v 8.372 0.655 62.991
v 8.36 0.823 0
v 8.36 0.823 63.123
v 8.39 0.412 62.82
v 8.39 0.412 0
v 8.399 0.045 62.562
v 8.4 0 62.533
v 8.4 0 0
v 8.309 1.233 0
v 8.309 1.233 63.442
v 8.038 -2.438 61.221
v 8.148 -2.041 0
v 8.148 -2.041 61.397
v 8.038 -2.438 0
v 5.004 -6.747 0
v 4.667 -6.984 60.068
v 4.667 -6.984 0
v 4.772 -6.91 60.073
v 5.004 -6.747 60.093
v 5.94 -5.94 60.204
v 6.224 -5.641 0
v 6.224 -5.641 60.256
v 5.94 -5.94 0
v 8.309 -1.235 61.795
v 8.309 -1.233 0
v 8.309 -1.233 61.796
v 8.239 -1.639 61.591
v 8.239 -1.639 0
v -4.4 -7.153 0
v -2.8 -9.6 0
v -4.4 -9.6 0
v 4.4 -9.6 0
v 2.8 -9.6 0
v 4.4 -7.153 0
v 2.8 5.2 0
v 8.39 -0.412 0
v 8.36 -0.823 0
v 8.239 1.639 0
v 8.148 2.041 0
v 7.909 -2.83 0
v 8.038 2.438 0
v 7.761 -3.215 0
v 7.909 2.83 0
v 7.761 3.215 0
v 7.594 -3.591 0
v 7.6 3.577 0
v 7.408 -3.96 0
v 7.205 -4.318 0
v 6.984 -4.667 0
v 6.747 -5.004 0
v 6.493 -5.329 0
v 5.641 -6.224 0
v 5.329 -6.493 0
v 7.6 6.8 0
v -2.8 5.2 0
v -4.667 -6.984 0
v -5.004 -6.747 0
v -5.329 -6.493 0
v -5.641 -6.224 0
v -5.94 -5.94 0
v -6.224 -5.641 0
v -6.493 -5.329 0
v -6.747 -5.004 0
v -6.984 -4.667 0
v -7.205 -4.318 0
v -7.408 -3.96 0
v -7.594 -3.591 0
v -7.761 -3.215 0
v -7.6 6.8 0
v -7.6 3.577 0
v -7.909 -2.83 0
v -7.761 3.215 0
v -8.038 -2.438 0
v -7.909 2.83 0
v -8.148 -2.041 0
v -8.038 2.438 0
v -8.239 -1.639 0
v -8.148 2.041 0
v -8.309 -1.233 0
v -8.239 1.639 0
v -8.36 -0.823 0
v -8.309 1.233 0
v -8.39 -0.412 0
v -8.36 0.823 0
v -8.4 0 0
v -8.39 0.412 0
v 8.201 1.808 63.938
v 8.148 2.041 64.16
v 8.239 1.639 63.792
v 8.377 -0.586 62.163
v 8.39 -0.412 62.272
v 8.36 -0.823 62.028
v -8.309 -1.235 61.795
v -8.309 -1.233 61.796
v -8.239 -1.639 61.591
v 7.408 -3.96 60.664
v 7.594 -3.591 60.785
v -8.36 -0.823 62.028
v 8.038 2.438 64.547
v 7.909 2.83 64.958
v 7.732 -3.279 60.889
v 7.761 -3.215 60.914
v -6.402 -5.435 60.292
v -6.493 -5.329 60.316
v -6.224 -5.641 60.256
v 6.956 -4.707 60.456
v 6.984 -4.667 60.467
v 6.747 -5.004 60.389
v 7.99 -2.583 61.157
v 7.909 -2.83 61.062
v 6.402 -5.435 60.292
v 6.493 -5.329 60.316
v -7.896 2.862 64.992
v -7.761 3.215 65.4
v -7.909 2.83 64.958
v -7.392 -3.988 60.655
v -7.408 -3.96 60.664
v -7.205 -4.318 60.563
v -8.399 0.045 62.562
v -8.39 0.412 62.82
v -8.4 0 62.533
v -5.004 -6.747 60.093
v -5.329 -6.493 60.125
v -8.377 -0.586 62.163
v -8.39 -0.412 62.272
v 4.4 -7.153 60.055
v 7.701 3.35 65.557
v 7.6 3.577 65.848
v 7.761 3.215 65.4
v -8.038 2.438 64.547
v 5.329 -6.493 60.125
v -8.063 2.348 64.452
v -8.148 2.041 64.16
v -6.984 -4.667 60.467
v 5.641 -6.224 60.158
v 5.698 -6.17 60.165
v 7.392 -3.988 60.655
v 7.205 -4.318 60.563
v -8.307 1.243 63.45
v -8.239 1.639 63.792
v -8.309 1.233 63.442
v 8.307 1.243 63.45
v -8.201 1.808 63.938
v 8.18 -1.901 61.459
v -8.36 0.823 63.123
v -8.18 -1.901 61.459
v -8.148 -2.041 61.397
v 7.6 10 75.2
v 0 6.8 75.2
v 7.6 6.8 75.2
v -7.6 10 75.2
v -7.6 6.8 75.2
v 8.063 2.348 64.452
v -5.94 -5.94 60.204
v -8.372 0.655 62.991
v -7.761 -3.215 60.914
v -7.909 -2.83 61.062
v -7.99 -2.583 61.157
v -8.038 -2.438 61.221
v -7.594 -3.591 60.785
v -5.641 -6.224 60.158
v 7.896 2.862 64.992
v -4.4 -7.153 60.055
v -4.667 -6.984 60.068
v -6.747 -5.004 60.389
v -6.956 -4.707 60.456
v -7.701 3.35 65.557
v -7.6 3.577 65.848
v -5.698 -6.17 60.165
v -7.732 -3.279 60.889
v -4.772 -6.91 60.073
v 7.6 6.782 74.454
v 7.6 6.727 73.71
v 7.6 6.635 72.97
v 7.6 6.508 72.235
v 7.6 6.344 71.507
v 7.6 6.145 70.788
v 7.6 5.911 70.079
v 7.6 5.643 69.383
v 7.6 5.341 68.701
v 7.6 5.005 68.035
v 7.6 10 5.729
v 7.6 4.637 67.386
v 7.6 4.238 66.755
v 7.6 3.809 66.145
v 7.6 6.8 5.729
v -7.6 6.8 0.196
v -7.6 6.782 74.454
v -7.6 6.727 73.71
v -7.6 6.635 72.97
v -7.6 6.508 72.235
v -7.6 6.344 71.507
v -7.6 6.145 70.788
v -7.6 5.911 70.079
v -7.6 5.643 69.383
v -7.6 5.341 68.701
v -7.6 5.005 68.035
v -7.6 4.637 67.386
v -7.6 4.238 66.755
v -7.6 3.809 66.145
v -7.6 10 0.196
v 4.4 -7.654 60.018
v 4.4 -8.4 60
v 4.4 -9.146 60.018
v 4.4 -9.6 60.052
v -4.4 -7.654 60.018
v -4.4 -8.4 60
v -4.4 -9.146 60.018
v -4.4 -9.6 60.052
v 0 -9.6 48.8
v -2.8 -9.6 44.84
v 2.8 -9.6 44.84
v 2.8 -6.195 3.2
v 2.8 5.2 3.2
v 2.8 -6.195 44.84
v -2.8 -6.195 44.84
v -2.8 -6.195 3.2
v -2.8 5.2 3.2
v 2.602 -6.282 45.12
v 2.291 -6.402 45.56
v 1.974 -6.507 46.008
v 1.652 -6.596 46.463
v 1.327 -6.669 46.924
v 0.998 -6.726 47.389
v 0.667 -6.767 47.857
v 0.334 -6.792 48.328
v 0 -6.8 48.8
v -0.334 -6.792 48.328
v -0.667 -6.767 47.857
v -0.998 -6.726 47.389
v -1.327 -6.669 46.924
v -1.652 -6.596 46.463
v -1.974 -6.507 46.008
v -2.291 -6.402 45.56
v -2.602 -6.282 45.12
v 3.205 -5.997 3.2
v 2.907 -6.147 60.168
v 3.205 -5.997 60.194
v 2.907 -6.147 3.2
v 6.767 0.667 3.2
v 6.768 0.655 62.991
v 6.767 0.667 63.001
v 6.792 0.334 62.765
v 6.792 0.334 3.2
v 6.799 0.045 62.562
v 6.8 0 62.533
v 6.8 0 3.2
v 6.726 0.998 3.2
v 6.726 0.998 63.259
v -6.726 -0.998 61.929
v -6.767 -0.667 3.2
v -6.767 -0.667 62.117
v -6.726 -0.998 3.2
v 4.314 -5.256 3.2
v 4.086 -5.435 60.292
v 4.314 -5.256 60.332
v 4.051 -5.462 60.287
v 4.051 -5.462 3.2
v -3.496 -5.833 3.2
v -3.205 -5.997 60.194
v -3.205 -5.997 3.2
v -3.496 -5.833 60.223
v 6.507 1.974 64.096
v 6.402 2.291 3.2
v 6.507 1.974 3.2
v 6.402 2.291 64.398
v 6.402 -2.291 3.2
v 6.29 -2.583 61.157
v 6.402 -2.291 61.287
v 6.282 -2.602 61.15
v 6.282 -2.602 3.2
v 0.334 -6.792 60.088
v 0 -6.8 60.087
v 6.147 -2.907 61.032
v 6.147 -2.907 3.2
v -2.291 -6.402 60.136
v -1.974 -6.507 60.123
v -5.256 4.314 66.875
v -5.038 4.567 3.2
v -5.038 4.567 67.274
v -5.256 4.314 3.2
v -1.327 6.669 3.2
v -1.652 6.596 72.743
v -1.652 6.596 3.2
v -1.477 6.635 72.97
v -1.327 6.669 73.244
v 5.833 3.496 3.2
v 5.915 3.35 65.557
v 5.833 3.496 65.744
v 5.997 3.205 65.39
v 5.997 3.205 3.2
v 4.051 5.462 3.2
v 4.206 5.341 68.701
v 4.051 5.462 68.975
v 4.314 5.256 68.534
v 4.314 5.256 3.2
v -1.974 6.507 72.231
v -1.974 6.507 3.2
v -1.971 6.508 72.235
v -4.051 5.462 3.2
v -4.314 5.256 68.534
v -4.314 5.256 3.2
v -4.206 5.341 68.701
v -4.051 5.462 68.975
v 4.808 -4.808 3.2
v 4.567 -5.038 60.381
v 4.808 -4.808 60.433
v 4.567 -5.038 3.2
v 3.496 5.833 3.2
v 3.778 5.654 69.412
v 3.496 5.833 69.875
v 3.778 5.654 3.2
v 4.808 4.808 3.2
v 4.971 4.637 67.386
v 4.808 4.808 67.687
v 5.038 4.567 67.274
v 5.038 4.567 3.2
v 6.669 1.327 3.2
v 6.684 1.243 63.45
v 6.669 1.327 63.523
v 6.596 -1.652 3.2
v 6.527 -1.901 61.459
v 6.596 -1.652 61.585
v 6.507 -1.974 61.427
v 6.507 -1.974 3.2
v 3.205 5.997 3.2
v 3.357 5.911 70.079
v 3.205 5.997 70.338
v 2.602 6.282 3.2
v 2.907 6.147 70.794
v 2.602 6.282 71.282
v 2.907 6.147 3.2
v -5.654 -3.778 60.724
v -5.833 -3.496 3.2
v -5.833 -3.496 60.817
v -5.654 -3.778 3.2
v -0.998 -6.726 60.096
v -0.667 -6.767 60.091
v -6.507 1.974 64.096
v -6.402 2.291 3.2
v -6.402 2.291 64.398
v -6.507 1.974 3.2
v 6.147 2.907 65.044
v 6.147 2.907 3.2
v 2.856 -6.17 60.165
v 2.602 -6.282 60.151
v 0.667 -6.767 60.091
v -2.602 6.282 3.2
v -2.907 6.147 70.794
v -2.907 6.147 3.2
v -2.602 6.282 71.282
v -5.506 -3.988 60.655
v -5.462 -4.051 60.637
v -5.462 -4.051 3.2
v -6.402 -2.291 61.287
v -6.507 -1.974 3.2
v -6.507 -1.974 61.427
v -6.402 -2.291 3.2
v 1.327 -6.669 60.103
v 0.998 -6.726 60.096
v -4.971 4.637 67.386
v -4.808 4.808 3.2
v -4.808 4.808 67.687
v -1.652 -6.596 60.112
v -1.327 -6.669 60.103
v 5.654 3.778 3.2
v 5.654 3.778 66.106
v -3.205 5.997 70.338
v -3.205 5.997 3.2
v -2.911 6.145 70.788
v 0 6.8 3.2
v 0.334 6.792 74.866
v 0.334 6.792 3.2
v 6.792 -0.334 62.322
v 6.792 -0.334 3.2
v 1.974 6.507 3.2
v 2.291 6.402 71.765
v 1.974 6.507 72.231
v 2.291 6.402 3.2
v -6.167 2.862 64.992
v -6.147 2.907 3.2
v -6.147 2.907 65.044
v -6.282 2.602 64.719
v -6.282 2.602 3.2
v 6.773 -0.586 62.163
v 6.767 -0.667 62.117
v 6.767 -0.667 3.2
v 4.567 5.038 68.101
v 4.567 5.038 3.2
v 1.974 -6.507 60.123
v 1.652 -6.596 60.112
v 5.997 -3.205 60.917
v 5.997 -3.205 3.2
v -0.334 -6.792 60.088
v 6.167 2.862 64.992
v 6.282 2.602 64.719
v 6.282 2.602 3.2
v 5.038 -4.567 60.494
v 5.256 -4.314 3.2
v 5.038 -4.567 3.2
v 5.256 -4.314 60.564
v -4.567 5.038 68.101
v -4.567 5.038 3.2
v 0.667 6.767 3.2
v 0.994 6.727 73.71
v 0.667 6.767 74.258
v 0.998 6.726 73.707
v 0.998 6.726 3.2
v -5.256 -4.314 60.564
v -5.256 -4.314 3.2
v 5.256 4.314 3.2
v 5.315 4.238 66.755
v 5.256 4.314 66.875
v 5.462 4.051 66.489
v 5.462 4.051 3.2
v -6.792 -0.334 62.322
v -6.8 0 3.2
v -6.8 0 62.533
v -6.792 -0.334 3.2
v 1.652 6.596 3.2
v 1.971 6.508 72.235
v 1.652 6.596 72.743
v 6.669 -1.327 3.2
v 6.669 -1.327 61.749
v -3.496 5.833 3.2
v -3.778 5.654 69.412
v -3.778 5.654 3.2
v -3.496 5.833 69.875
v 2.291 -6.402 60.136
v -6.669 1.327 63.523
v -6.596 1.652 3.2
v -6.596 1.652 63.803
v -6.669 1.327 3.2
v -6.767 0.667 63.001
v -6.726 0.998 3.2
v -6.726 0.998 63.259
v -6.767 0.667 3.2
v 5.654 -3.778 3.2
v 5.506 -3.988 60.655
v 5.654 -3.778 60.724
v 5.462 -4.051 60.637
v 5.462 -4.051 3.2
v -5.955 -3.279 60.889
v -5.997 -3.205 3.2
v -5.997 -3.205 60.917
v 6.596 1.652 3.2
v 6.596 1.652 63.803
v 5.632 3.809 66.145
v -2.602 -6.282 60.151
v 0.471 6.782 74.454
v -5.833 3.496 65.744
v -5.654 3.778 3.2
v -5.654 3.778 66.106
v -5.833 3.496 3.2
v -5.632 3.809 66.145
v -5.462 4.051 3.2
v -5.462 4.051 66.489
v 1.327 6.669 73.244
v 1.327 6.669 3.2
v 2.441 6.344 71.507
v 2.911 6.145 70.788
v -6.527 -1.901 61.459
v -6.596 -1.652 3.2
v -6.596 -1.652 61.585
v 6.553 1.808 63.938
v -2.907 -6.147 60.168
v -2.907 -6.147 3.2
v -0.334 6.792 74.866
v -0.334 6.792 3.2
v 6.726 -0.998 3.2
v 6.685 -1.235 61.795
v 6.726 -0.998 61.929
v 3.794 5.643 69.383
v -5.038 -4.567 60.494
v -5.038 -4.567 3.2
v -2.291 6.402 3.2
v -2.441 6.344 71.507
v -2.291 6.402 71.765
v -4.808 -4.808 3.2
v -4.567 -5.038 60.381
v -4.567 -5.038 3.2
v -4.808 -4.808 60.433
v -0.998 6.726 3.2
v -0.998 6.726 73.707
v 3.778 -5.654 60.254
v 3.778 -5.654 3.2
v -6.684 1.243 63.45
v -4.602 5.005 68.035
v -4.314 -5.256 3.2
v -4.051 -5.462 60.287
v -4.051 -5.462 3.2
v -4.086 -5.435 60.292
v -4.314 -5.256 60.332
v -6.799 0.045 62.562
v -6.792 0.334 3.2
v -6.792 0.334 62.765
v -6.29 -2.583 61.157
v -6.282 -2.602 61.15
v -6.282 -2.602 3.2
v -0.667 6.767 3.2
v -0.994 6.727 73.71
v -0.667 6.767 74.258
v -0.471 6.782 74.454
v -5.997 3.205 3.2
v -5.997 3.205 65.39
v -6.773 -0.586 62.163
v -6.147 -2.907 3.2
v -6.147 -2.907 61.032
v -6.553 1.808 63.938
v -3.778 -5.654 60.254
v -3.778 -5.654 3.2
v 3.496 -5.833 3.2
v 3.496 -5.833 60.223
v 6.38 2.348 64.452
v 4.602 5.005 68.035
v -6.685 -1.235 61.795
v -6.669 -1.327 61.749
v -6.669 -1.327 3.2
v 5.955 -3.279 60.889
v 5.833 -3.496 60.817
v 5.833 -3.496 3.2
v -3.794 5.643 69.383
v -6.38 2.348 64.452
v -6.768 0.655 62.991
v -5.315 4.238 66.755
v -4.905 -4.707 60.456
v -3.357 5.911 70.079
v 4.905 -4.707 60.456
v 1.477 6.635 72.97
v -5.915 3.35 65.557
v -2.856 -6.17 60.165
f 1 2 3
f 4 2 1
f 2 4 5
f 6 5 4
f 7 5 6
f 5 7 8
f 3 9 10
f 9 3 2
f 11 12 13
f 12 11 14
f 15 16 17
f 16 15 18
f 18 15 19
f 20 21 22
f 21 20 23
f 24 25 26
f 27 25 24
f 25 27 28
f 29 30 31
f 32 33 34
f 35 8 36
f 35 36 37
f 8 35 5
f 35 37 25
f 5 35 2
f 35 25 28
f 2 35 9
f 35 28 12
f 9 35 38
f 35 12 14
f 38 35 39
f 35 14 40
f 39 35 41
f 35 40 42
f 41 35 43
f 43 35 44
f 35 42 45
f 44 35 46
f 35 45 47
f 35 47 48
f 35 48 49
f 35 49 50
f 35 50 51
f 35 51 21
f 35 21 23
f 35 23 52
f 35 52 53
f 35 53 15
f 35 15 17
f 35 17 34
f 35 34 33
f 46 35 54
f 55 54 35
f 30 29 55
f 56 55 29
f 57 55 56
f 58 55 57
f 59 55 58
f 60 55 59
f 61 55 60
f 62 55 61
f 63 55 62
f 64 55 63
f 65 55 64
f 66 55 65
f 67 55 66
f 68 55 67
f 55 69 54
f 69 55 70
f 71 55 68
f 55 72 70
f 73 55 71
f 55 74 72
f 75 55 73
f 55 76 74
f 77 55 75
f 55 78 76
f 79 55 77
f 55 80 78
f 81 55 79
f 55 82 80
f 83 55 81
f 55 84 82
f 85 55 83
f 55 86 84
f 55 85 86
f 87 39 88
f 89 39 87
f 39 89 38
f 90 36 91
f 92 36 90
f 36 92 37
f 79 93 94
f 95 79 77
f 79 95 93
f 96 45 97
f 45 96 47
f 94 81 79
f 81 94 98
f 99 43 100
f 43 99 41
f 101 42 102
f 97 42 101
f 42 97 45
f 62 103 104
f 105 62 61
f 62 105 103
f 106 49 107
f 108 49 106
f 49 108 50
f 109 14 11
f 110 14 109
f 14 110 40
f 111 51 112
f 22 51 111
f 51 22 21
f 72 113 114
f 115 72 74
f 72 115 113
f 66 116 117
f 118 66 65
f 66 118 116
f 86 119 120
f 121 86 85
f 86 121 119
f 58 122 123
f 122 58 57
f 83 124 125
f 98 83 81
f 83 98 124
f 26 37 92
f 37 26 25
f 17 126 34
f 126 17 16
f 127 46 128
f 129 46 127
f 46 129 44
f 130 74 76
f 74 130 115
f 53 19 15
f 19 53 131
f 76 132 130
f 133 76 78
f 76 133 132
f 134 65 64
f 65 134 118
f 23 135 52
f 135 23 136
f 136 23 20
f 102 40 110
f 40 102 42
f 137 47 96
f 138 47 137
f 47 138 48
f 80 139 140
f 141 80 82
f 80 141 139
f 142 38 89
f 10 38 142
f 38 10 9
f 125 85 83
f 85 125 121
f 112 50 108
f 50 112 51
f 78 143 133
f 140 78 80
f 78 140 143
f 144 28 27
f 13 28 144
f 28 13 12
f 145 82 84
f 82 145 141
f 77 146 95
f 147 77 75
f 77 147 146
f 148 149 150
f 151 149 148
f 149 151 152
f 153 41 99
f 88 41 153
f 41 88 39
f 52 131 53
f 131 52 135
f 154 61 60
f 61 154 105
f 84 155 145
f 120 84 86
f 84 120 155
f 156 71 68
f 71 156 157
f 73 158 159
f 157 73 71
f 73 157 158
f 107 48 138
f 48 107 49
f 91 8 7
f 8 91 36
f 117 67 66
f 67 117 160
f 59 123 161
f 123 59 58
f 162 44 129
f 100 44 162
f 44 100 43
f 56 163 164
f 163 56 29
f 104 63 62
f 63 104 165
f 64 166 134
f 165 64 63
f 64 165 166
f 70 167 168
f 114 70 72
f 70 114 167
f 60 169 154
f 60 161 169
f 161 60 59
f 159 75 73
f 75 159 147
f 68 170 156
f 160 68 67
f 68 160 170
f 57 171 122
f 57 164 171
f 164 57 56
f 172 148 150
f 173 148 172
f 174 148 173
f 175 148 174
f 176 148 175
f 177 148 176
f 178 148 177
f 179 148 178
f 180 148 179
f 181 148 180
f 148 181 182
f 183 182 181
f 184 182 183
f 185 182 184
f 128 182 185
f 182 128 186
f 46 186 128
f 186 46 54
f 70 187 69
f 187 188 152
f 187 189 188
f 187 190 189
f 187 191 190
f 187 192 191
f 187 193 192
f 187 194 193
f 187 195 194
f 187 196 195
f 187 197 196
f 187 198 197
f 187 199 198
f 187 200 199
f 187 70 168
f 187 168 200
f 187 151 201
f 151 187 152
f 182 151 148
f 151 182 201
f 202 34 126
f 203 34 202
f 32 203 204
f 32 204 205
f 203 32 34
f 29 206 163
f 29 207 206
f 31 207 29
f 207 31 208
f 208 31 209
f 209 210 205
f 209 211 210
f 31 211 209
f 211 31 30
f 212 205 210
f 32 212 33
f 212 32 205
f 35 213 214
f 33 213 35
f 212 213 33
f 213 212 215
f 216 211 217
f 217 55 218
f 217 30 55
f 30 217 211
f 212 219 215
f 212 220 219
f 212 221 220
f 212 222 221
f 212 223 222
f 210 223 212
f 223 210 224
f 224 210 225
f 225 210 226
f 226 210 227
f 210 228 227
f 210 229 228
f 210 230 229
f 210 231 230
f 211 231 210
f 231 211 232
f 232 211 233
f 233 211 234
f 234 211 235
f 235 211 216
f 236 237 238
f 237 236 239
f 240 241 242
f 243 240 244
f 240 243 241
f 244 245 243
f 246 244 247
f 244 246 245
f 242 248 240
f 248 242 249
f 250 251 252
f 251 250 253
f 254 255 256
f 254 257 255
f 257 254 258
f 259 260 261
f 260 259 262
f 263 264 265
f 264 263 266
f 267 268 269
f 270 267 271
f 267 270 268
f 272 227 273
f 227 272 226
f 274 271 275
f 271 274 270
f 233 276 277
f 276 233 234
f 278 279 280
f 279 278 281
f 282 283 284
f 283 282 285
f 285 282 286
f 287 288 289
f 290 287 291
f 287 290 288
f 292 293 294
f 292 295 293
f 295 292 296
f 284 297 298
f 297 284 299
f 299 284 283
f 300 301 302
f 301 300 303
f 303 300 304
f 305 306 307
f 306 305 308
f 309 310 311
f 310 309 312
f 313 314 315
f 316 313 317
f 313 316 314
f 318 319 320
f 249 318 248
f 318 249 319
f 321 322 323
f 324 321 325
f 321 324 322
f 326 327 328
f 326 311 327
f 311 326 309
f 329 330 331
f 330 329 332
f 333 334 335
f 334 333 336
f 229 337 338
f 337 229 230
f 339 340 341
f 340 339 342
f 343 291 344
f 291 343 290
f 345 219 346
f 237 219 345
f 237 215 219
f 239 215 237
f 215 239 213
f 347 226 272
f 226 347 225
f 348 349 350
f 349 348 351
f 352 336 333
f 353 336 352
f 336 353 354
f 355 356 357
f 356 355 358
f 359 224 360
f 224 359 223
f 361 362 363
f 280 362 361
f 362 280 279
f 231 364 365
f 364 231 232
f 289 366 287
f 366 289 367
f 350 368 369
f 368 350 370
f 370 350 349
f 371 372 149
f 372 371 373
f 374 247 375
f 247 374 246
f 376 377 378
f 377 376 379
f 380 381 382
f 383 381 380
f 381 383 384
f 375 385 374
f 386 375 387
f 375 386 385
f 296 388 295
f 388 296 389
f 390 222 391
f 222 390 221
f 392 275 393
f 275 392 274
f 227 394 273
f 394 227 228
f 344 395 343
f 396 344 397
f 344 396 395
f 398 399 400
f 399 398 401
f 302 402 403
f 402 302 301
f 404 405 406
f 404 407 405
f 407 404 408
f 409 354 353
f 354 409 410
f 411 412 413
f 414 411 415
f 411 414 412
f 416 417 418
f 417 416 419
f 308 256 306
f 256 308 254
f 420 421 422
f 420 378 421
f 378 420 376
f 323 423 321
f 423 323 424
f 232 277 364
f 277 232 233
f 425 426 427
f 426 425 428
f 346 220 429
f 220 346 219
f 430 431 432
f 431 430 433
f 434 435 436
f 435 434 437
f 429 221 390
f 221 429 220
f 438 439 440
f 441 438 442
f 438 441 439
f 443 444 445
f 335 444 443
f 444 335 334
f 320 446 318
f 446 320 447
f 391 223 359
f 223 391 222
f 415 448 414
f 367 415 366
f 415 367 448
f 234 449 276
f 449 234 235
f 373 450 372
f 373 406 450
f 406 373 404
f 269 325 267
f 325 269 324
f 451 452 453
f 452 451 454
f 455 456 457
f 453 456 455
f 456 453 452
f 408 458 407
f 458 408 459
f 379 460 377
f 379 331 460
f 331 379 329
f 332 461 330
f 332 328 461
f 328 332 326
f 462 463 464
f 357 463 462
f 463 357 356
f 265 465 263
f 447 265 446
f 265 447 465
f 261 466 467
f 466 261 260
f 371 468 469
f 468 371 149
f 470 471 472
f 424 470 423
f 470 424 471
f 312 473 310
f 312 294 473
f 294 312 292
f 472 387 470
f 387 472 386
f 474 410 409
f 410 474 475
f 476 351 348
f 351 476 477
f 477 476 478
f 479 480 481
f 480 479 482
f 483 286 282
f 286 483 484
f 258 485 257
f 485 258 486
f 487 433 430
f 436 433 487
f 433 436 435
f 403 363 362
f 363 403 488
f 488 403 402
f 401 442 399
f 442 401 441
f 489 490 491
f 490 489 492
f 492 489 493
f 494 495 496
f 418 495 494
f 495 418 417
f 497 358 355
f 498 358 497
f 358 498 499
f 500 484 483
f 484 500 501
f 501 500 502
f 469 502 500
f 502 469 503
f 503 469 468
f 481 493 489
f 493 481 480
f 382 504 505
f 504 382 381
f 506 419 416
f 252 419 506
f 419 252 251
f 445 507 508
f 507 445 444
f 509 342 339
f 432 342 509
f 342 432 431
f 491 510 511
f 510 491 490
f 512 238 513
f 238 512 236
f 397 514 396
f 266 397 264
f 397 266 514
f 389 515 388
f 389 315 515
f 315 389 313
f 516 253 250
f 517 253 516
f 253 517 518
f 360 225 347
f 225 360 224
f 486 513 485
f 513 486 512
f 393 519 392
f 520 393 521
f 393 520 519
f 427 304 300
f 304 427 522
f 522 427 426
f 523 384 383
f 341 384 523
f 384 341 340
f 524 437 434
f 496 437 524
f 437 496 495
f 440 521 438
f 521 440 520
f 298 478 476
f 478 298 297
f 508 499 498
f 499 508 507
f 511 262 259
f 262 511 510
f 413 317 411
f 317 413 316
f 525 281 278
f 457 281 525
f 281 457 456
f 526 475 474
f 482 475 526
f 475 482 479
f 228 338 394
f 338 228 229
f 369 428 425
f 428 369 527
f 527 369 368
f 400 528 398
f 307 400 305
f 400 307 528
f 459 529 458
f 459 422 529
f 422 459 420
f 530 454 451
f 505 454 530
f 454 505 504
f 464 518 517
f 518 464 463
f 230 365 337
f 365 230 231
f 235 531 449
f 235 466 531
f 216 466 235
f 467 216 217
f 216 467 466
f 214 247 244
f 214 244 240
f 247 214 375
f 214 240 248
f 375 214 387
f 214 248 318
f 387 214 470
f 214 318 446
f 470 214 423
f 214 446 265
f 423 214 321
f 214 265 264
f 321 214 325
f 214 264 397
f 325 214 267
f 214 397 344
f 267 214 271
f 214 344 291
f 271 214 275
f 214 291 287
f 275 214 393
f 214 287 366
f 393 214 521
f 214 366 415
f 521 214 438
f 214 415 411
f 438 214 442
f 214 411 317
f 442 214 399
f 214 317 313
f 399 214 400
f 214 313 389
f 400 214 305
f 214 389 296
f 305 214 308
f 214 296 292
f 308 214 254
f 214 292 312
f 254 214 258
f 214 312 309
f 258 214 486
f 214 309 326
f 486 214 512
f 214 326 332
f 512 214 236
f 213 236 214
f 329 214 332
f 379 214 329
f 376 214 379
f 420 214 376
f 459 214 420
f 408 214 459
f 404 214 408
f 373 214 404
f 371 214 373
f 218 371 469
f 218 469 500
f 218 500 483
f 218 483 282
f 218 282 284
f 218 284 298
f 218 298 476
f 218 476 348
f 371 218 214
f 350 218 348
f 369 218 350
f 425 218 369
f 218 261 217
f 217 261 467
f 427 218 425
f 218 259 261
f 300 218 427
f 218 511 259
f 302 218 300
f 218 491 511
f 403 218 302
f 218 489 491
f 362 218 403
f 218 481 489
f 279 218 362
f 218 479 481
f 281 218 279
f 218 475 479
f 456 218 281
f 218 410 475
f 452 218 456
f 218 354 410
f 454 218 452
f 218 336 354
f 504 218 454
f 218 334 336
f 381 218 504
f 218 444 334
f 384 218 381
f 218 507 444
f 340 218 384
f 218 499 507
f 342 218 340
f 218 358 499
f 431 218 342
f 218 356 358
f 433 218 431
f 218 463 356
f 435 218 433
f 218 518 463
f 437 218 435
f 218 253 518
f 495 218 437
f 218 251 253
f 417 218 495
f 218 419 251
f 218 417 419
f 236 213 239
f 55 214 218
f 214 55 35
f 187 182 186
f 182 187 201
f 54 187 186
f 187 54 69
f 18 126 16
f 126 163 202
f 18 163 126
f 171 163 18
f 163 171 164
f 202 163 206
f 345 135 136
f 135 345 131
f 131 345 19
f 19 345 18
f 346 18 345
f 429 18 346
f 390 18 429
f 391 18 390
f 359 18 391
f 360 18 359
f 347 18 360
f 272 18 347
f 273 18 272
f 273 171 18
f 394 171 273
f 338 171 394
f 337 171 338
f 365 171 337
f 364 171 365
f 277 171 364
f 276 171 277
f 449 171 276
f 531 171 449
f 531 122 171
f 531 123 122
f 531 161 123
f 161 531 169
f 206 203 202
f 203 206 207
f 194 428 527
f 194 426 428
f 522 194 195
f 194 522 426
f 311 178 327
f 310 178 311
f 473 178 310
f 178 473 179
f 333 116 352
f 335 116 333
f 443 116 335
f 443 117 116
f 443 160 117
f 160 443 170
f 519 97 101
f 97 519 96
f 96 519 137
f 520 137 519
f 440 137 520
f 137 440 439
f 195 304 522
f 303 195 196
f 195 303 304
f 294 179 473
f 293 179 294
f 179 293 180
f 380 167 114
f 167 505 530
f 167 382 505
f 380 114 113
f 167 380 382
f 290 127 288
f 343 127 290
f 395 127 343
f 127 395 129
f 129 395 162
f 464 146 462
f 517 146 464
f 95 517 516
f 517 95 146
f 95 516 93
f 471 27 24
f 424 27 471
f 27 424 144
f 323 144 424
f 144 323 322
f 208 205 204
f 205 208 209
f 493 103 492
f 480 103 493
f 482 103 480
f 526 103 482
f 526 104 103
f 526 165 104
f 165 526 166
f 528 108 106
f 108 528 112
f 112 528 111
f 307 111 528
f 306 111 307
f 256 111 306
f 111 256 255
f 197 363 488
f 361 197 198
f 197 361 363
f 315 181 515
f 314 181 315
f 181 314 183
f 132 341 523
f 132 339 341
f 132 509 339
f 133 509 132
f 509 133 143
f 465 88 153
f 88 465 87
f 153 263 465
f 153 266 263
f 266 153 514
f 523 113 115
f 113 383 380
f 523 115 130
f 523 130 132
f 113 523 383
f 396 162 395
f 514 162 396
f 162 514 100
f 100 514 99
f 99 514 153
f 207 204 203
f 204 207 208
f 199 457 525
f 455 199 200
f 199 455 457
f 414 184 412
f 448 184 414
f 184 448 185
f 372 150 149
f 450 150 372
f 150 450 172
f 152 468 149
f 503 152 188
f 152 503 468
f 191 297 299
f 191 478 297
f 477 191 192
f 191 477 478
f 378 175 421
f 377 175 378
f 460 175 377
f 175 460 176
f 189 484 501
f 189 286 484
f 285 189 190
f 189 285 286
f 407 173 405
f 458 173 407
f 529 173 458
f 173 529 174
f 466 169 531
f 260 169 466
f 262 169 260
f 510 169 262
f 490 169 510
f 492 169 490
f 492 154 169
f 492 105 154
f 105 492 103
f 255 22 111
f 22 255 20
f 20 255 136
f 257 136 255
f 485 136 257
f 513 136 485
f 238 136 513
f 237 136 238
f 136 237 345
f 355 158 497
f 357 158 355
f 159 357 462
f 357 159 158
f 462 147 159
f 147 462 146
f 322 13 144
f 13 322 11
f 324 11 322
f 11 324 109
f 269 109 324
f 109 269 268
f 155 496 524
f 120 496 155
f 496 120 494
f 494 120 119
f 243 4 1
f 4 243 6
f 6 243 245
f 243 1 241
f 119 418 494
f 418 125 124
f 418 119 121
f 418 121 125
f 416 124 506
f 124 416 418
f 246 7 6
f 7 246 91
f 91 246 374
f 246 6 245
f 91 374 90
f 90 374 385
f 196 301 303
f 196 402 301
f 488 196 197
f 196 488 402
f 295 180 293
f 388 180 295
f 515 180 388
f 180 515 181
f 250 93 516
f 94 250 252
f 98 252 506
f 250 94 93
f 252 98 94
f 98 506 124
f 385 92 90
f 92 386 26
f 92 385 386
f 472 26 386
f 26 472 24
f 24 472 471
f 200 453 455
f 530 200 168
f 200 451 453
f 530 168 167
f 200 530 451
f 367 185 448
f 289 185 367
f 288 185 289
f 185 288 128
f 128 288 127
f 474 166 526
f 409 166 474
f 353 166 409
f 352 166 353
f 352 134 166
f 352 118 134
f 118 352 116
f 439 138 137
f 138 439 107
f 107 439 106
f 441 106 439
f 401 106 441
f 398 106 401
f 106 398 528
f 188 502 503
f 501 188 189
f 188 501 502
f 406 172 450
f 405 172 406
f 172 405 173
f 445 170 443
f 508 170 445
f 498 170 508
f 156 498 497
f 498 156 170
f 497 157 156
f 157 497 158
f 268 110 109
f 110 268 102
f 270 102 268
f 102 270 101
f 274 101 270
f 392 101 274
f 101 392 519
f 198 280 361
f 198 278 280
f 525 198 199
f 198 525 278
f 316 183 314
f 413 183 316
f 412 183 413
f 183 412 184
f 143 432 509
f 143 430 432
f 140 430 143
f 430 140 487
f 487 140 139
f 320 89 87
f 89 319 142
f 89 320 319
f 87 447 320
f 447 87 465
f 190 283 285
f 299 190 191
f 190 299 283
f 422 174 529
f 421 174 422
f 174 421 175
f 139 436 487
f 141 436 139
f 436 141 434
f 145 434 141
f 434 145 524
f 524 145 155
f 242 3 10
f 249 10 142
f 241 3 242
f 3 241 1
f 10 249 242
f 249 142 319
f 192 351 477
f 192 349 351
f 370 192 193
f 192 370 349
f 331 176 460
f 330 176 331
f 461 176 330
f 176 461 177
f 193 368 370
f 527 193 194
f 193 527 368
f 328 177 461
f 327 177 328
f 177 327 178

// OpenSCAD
// file: constants.scad
$fn = 128;
clearance = 0.2;        // wherever parts meet
print_head_width = 0.4; // 3d printer head diameter
print_no_support_angle = 50;  // overhang angle that needs no support

//spec_dart_d = 19;     // mega dart diameter
//d_len = 95;           // mega dart length
spec_dart_d = 13;       // spec elite dart diameter
d_len = 72;             // elite dart length
min_chamber_count = 15; // minimum chambers per cylinder
desired_cuff_d = 98;    // minimum cuff diameter in mm
jam_slot_width = 5.6;   // multiple of head diameter
race1 = 15;             // bottom edge of bearing race position.
bearing_w = 4 + 1;
bearing_d = 10;
bearing_inner_d = 5;
ratchet_angle = -20;

brushless_motor_d = 22;
brushless_motor_h = 12;
brushless_motor_screw_d = 5;
brushless_motor_screw_mount_r = 19/2;

// calculated constants
w_thickness = 4 * print_head_width; //multiples of 3d printer head diameter -> 1.6
flywheel_thickness = w_thickness * 2;
cyl_inner_thickness = w_thickness;

dart_d = ceil((spec_dart_d + 2 * clearance)/print_head_width) * print_head_width;
echo("calculated dart_d", dart_d);
dart_r = dart_d/2;

jam_slot_support_len = jam_slot_width * 2;

// Calculate the number of chambers based on chamber count and minimum cuff diameter
cuff_to_dart_delta = 3 * w_thickness + cyl_inner_thickness + dart_r;
calc_cyl_radius = desired_cuff_d/2 + cuff_to_dart_delta;
calc_cyl_deg = 2 * asin((dart_r + w_thickness/2)/calc_cyl_radius);
calc_ch_count = ceil(360/calc_cyl_deg);  // always round up

chamber_count = max([min_chamber_count, calc_ch_count]);
echo("minimum chamber count", min_chamber_count);
echo("final_chamber_count ", chamber_count);

brushless_motor_screw_mount_side = brushless_motor_screw_mount_r * sqrt(2);
motormount_w = (dart_r + flywheel_thickness) * 2 + brushless_motor_d;

cyl_len = d_len + w_thickness * 2;
race2 = cyl_len - race1 - bearing_w; // bottom edge of upper bearing
toroid_r = dart_d + w_thickness;
chamber_r = dart_r + w_thickness;
chamber_d = chamber_r * 2;
cyl_degrees = 360/chamber_count;
// chambers only need 1 w_thickness between each other
cyl_draw_radius = (dart_r + w_thickness/2) / sin(cyl_degrees/2);

echo("Minimum dart length", toroid_r + motormount_w/2 + jam_slot_support_len);

inner_r = cyl_draw_radius - dart_r - w_thickness;
final_inner = inner_r - cyl_inner_thickness;
race_r = final_inner + w_thickness;

// ratchet constants
post_d = w_thickness * 2;
slot_l = chamber_d + post_d; // a little extra movement
ratchet_l = chamber_d*2 + slot_l + post_d;
ratchet_w = post_d + w_thickness * 2;
ratchet_t = w_thickness * 1.5;

// constants for the motor mount and cylinder mount
cuff_outer_r = final_inner - w_thickness;
cuff_inner_r = cuff_outer_r - w_thickness;

echo("desired inner cuff diameter ", desired_cuff_d);
echo("final inner cuff diameter ", cuff_inner_r * 2);

cuff_h = cyl_len + w_thickness *2;
flange_r = cuff_outer_r + toroid_r;
bearing_mount_r = race_r - bearing_d/2;
mount_offset = race_r - bearing_d - w_thickness * 2;
mount_w = sqrt(cuff_outer_r * cuff_outer_r - mount_offset * mount_offset) * 2;
m_thickness = w_thickness * 2;
mount_alignment = m_thickness + (flywheel_thickness + brushless_motor_h)/2;
slider_t = cyl_draw_radius - mount_alignment - mount_offset;
slider_offset = slider_t + brushless_motor_screw_d/2 + w_thickness;

// returns a list of angles for the points of a regular polygon
function regular_polygon_angles(order) = [for (i=[0:order-1]) i*(360/order)];

// returns a list of coordinates and angle for the endpoints of a regular polygon
function regular_polygon_translation(order, r=1) = [
    for (th=regular_polygon_angles(order)) [[r*cos(th), r*sin(th), 0], th]];

module pipe(h, inner, outer) {
    difference() {
        cylinder(h, r=outer);
        cylinder(h, r=inner);
    }
}
module toroid(circle_r, toroid_r, convexity=10) {
    rotate_extrude(convexity)
    translate([toroid_r, 0, 0]) circle(r = circle_r);

}
module slide_slot(w, h, l, c=-clearance) {
    t_w = w * 2/3;
    t_l = l/2 + c;
    // clearance can be negative when building the part that goes inside
    difference() {
        union() {
            cube([w-t_w, h, l], center=true);
            translate([0, 0, l-t_l])
                resize([t_w + c , 0, 0]) rotate([0, 45, 0])
                cube([t_w, h, t_w], center=true);
        }
        translate([0, 0, l])
            cube([l, h, l], center=true);
        
    }
}

module slide_mount(slider_w, slider_l, slider_t, top=true) {
    if (top==true) {
        difference() {
            cube([slider_w, slider_l, slider_t], center=true);
            slide_slot(slider_w, slider_l, slider_t);
        }
    } else {
        slide_slot(slider_w, slider_l, slider_t);
    }
}
// main file
include <constants.scad>

module chamber(angle=0) {
    jswhalf = jam_slot_width/2.0;
    jswallw = jam_slot_width + 2.0 * w_thickness;
    js_support_offset = (toroid_r + jam_slot_support_len +  jam_slot_width * sqrt(2)/2);

    rotate(angle + 90) difference() {
		union() {
			difference() {
				difference () {
					union () {
						cylinder(h=cyl_len, r=chamber_r);
						// inner flat
						translate([0, chamber_r/2 + w_thickness, cyl_len/2])
							cube([chamber_d - w_thickness, chamber_r, cyl_len], center=true);
						// outer jam slot
						translate([0, -dart_r -jswhalf/2, cyl_len/2])
							cube([jswallw, jswhalf, cyl_len], center=true);
					}
                    // remove the channel for fixing any dart jams
                    translate([0, -dart_r -jswhalf/2 , cyl_len/2 - js_support_offset])
                        union() {
                            cube ([jam_slot_width, jam_slot_width, cyl_len], center=true);
                            //pointy top to prevent the need for support
                            translate([0, 0, cyl_len/2])
                                resize([jam_slot_width, 0, 0]) rotate([0, 45, 0])
                                cube (jam_slot_width, center=true);
                        }
				}
				// remove the part where the dart will go
				cylinder(h=cyl_len, r=dart_r);
			}
			// add bottom dart stopper so dart doesn't fall out the back
			difference(){
				cylinder(h=w_thickness *2, r=dart_r);
				// remove slot for pusher
				translate([0, -w_thickness, w_thickness])
					cube([jam_slot_width, dart_d, w_thickness * 2], center=true);
				}
		}
		// remove angled section for the revolver ratchet 
		// NOTE: change sign of ratchet_angle for cylinder to rotate in other direction
		ratchet_h = abs(chamber_d * tan(ratchet_angle));
		ratchet_w = abs(chamber_d / cos(ratchet_angle));// *2; // needs to be long
        union () {
            translate([-1 *sign(ratchet_angle) * w_thickness/2, chamber_r, 0])
                rotate(a=[0, ratchet_angle, 0])
                cube(size=[ratchet_w, w_thickness * 2, ratchet_h], center=true);
            if (single_chamber==true ) {
                // if only printing one cylinder for test sizing,
                // remove the cylinder at the top of the chamber
                translate([0, dart_r-toroid_r, cyl_len])
                    rotate([0, 90, 0])
                    translate([0, 0, -chamber_r])
                    cylinder(chamber_r *2, r = toroid_r);
            }
        }
    }
}

module chambers() {
    coords=regular_polygon_translation(chamber_count, r=cyl_draw_radius);
    for(t=coords) translate(t[0]) chamber(t[1]);
}

module bearing_race(height) {
    cone_h = tan(print_no_support_angle)*(final_inner + w_thickness);
    translate([0, 0, height])
        union() {
		    cylinder(bearing_w, r=final_inner + w_thickness);
            translate([0, 0, bearing_w])
                cylinder(cone_h, r1=final_inner + w_thickness);
            }
}

module full_cylinder() {
    difference() {
        union() {
            chambers();
            // smooth the inside of the cylinder
            above_ratchet = abs(sin(ratchet_angle) * (chamber_d - w_thickness));
            echo("ratchet_height", above_ratchet);
            echo("w_thickness * 2", w_thickness * 2);
            translate([0, 0, above_ratchet])  // above the ratchet
                pipe(cyl_len - above_ratchet, final_inner, inner_r);
        }
        union() {
            // bearing race1
            bearing_race(race1);
            // bearing race2
            bearing_race(race2);
        }
	}
}

module final_cylinder() {
    difference() {
        full_cylinder();
		// remove the toroid at the top of the cylinder
        translate([0, 0, cyl_len])
			rotate_extrude(convexity = 10, $fn=chamber_count)
			translate([cyl_draw_radius + chamber_r, 0, 0])
			circle(r = toroid_r, $fn=toroid_r * 5);
    }
}
single_chamber = true;
if (single_chamber == true) {
    chamber(-90);
} else {
    final_cylinder();
}
